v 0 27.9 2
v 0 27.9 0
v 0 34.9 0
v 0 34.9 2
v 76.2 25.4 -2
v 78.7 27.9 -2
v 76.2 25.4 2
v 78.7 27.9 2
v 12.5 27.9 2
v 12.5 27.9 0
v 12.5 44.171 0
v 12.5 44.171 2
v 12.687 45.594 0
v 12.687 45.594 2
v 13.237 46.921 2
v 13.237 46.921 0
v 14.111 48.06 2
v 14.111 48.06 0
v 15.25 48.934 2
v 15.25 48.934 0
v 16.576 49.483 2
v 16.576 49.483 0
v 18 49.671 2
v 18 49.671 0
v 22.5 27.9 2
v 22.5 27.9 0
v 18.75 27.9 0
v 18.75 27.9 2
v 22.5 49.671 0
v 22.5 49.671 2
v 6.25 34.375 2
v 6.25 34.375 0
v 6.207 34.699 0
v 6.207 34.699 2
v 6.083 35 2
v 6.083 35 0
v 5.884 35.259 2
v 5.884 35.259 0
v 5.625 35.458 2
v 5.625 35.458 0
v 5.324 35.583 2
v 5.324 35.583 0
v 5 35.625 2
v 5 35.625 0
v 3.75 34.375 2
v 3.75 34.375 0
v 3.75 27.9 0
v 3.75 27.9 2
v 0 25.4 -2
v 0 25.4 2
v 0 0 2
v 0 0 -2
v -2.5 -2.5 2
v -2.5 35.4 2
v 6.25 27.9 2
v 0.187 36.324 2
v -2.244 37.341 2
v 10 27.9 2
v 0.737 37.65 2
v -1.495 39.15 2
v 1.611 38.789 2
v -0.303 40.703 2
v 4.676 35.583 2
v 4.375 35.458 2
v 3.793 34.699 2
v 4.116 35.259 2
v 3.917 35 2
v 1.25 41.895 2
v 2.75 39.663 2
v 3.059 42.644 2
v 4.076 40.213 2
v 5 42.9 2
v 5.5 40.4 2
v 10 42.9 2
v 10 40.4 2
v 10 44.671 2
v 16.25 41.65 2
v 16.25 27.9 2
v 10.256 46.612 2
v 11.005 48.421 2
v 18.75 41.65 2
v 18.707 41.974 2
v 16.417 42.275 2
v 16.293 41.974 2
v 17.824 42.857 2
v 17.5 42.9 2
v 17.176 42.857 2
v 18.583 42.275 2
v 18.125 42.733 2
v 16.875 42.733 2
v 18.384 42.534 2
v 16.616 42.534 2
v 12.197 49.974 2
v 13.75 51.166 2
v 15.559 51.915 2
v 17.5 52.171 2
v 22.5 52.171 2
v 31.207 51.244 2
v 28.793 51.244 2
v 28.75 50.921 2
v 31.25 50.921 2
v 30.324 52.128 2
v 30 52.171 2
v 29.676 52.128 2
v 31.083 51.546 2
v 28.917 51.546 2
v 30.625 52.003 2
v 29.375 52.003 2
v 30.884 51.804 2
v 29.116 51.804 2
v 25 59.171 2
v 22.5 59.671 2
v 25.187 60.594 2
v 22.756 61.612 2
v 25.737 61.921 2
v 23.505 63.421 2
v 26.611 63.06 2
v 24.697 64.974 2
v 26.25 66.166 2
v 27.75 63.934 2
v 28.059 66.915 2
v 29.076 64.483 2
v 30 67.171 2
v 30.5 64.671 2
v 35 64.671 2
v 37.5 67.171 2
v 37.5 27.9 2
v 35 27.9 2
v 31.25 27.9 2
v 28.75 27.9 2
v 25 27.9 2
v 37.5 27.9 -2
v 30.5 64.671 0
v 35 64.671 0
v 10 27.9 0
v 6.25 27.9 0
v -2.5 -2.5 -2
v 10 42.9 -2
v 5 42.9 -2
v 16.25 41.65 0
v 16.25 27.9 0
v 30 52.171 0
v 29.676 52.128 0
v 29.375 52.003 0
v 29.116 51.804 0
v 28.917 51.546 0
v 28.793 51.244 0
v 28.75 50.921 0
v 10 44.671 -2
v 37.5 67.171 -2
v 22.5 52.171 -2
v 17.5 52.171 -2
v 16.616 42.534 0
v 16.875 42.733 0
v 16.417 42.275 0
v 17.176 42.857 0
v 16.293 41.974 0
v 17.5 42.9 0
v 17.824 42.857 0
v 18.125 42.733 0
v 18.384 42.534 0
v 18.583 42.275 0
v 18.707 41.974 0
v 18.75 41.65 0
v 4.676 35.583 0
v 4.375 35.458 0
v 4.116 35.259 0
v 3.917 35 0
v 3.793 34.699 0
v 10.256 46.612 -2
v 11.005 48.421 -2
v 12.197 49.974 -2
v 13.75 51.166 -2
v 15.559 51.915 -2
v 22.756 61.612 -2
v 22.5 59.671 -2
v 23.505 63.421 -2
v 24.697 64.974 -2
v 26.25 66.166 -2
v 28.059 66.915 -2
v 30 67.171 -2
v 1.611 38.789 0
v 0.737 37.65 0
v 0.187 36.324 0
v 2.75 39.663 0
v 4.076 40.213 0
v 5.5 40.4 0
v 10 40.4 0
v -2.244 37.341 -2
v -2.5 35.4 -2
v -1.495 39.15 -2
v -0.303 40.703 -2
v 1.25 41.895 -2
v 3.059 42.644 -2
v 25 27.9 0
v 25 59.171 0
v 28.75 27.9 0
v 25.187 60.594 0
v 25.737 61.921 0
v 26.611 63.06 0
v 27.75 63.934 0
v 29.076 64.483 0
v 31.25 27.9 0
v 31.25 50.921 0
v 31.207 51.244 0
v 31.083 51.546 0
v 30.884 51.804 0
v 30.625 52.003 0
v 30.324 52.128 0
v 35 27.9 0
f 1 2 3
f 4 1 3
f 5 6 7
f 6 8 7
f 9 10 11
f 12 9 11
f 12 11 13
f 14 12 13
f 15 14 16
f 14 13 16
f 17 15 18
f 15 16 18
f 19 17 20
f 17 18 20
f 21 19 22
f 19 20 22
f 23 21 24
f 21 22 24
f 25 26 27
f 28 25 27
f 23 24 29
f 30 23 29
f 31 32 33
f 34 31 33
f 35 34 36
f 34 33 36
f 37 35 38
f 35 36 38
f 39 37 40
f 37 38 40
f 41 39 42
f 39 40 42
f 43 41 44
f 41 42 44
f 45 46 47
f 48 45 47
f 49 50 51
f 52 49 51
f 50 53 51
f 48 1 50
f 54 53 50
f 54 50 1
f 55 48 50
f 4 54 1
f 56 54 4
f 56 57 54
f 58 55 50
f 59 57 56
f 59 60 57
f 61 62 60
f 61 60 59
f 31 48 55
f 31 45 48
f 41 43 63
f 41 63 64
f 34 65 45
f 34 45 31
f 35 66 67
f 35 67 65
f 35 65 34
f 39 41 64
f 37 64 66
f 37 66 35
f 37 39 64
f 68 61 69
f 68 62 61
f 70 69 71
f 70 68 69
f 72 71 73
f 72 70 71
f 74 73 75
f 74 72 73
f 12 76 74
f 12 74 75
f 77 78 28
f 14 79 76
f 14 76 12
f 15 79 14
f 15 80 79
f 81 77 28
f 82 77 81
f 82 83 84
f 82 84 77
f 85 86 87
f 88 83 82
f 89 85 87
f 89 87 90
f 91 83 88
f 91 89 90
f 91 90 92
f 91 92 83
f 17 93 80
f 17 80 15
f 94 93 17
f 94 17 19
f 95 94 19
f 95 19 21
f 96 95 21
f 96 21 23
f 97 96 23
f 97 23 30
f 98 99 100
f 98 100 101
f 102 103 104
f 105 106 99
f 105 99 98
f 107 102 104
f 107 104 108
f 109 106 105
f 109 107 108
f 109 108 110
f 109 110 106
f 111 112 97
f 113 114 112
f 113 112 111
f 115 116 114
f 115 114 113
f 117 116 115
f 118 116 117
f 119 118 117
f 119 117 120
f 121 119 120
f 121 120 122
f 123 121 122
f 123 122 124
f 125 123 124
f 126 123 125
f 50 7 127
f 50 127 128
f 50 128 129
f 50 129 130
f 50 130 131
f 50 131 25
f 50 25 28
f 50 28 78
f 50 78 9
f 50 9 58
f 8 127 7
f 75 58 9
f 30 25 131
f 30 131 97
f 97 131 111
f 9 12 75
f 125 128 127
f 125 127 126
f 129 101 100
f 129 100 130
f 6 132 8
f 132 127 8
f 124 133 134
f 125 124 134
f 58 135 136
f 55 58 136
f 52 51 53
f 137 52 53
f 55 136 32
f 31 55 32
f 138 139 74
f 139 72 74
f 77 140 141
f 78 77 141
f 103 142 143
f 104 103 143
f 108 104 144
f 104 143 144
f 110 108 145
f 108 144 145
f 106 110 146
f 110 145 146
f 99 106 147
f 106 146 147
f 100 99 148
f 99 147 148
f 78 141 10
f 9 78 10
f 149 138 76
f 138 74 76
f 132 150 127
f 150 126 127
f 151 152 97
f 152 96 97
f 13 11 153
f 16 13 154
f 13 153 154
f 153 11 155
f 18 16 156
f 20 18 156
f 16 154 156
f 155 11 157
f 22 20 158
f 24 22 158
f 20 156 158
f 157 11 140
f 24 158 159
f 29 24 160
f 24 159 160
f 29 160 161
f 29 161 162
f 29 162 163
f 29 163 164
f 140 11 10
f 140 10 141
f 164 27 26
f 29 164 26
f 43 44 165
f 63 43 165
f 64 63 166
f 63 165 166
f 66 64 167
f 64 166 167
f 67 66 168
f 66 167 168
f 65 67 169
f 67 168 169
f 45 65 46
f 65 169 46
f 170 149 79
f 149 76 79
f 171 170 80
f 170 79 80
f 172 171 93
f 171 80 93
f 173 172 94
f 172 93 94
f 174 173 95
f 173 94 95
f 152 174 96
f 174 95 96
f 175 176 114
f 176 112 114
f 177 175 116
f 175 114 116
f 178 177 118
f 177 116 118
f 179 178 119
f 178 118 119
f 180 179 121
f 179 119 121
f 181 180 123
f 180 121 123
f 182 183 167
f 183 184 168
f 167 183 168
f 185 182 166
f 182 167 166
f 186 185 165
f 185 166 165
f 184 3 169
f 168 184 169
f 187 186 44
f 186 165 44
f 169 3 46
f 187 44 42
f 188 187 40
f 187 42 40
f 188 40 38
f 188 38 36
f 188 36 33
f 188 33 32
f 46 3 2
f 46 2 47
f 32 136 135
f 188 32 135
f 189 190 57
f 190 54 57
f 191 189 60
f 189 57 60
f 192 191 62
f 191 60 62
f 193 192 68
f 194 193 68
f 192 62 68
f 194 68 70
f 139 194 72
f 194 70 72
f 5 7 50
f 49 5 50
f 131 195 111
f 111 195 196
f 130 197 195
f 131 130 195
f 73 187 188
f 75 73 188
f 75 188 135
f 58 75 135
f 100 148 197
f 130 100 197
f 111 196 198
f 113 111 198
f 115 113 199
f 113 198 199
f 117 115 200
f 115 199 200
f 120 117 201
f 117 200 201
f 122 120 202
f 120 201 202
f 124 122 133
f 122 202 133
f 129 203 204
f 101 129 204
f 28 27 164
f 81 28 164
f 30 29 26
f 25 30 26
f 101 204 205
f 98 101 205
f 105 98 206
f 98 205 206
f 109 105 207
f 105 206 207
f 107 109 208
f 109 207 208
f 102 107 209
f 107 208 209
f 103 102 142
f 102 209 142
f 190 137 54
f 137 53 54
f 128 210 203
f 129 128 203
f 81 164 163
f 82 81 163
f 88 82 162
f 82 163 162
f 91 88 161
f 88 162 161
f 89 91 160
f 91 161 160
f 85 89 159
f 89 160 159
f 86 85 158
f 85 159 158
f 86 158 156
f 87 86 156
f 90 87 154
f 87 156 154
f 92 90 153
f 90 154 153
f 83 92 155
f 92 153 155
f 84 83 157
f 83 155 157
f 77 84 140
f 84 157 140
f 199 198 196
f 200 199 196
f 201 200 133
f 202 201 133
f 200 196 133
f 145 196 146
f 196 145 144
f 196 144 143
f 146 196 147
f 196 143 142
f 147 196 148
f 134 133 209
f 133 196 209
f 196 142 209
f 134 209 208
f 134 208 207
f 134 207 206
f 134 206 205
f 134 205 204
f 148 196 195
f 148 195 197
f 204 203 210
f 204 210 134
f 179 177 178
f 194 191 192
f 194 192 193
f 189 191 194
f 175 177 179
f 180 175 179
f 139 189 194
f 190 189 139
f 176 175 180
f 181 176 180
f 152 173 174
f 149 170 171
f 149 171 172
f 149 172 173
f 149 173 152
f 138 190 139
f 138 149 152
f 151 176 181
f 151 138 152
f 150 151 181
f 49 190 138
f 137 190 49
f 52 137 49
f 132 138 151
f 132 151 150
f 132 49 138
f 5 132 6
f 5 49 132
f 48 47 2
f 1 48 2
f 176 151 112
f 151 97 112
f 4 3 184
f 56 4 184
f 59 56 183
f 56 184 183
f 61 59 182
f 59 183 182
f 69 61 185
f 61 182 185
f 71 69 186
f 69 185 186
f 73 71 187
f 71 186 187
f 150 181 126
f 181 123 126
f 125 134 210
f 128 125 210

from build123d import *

# Parameters (mm, degrees)
F1_DEPTH = 2
F3_DEPTH = 2
F5_DEPTH = 2
F7_DEPTH = 2
F9_DEPTH = 2


with BuildPart() as f1:
    # F0 (on Top) → F1 (new body)
    with BuildSketch(Plane.XY):
        with BuildLine():
            Line((-2.5, -2.5), (0, 0))
            Line((0, 0), (0, 25.4))
            Line((0, 25.4), (76.2, 25.4))
            Line((76.2, 25.4), (78.7, 27.9))
            Line((78.7, 27.9), (37.5, 27.9))
            Line((37.5, 27.9), (37.5, 67.17051))
            Line((37.5, 67.17051), (35, 67.17051))
            Line((35, 67.17051), (30, 67.17051))
            ThreePointArc((30, 67.17051), (24.696699, 64.973811), (22.5, 59.67051))
            Line((22.5, 59.67051), (22.5, 52.17051))
            Line((22.5, 52.17051), (17.5, 52.17051))
            ThreePointArc((17.5, 52.17051), (12.196699, 49.973811), (10, 44.67051))
            Line((10, 44.67051), (10, 42.9))
            Line((10, 42.9), (5, 42.9))
            ThreePointArc((5, 42.9), (-0.303301, 40.703301), (-2.5, 35.4))
            Line((-2.5, 35.4), (-2.5, 27.9))
            Line((-2.5, 27.9), (-2.5, -2.5))
        make_face()
        with BuildLine():
            Line((5.5, 40.4), (10, 40.4))
            Line((10, 40.4), (10, 27.9))
            Line((10, 27.9), (0, 27.9))
            Line((0, 27.9), (0, 34.9))
            ThreePointArc((0, 34.9), (1.610913, 38.789087), (5.5, 40.4))
        make_face(mode=Mode.SUBTRACT)
        with BuildLine():
            Line((18, 49.67051), (22.5, 49.67051))
            Line((22.5, 49.67051), (22.5, 27.9))
            Line((22.5, 27.9), (12.5, 27.9))
            Line((12.5, 27.9), (12.5, 44.17051))
            ThreePointArc((12.5, 44.17051), (14.110913, 48.059597), (18, 49.67051))
        make_face(mode=Mode.SUBTRACT)
        with BuildLine():
            Line((30.5, 64.67051), (35, 64.67051))
            Line((35, 64.67051), (35, 27.9))
            Line((35, 27.9), (25, 27.9))
            Line((25, 27.9), (25, 59.17051))
            ThreePointArc((25, 59.17051), (26.610913, 63.059597), (30.5, 64.67051))
        make_face(mode=Mode.SUBTRACT)
    extrude(amount=F1_DEPTH)

    # F2 (on face) → F3 (join)
    with BuildSketch(Plane(origin=(0, 0, 0), x_dir=(1, 0, 0), z_dir=(0, 0, -1))):
        with BuildLine():
            Line((0, 0), (-2.5, 2.5))
            Line((-2.5, 2.5), (-2.5, -35.4))
            ThreePointArc((-2.5, -35.4), (-0.303301, -40.703301), (5, -42.9))
            Line((5, -42.9), (10, -42.9))
            Line((10, -42.9), (10, -44.67051))
            ThreePointArc((10, -44.67051), (12.196699, -49.973811), (17.5, -52.17051))
            Line((17.5, -52.17051), (22.5, -52.17051))
            Line((22.5, -52.17051), (22.5, -59.67051))
            ThreePointArc((22.5, -59.67051), (24.696699, -64.973811), (30, -67.17051))
            Line((30, -67.17051), (37.5, -67.17051))
            Line((37.5, -67.17051), (37.5, -27.9))
            Line((37.5, -27.9), (78.7, -27.9))
            Line((78.7, -27.9), (76.2, -25.4))
            Line((76.2, -25.4), (0, -25.4))
            Line((0, -25.4), (0, 0))
        make_face()
    extrude(amount=F3_DEPTH)

    # F4 (on face) → F5 (join)
    with BuildSketch(Plane.XY):
        with BuildLine():
            Line((3.75, 34.375425), (3.75, 27.9))
            Line((3.75, 27.9), (6.25, 27.9))
            Line((6.25, 27.9), (6.25, 34.375425))
            ThreePointArc((6.25, 34.375425), (5.883883, 35.259308), (5, 35.625425))
            ThreePointArc((5, 35.625425), (4.116117, 35.259308), (3.75, 34.375425))
        make_face()
    extrude(amount=F5_DEPTH)

    # F6 (on face) → F7 (join)
    with BuildSketch(Plane.XY):
        with BuildLine():
            Line((16.25, 41.65), (16.25, 27.9))
            Line((16.25, 27.9), (18.75, 27.9))
            Line((18.75, 27.9), (18.75, 41.65))
            ThreePointArc((18.75, 41.65), (18.383883, 42.533883), (17.5, 42.9))
            ThreePointArc((17.5, 42.9), (16.616117, 42.533883), (16.25, 41.65))
        make_face()
    extrude(amount=F7_DEPTH)

    # F8 (on face) → F9 (join)
    with BuildSketch(Plane.XY):
        with BuildLine():
            Line((28.75, 50.92051), (28.75, 27.9))
            Line((28.75, 27.9), (31.25, 27.9))
            Line((31.25, 27.9), (31.25, 50.92051))
            ThreePointArc((31.25, 50.92051), (30.883883, 51.804393), (30, 52.17051))
            ThreePointArc((30, 52.17051), (29.116117, 51.804393), (28.75, 50.92051))
        make_face()
    extrude(amount=F9_DEPTH)


solid = f1.part
